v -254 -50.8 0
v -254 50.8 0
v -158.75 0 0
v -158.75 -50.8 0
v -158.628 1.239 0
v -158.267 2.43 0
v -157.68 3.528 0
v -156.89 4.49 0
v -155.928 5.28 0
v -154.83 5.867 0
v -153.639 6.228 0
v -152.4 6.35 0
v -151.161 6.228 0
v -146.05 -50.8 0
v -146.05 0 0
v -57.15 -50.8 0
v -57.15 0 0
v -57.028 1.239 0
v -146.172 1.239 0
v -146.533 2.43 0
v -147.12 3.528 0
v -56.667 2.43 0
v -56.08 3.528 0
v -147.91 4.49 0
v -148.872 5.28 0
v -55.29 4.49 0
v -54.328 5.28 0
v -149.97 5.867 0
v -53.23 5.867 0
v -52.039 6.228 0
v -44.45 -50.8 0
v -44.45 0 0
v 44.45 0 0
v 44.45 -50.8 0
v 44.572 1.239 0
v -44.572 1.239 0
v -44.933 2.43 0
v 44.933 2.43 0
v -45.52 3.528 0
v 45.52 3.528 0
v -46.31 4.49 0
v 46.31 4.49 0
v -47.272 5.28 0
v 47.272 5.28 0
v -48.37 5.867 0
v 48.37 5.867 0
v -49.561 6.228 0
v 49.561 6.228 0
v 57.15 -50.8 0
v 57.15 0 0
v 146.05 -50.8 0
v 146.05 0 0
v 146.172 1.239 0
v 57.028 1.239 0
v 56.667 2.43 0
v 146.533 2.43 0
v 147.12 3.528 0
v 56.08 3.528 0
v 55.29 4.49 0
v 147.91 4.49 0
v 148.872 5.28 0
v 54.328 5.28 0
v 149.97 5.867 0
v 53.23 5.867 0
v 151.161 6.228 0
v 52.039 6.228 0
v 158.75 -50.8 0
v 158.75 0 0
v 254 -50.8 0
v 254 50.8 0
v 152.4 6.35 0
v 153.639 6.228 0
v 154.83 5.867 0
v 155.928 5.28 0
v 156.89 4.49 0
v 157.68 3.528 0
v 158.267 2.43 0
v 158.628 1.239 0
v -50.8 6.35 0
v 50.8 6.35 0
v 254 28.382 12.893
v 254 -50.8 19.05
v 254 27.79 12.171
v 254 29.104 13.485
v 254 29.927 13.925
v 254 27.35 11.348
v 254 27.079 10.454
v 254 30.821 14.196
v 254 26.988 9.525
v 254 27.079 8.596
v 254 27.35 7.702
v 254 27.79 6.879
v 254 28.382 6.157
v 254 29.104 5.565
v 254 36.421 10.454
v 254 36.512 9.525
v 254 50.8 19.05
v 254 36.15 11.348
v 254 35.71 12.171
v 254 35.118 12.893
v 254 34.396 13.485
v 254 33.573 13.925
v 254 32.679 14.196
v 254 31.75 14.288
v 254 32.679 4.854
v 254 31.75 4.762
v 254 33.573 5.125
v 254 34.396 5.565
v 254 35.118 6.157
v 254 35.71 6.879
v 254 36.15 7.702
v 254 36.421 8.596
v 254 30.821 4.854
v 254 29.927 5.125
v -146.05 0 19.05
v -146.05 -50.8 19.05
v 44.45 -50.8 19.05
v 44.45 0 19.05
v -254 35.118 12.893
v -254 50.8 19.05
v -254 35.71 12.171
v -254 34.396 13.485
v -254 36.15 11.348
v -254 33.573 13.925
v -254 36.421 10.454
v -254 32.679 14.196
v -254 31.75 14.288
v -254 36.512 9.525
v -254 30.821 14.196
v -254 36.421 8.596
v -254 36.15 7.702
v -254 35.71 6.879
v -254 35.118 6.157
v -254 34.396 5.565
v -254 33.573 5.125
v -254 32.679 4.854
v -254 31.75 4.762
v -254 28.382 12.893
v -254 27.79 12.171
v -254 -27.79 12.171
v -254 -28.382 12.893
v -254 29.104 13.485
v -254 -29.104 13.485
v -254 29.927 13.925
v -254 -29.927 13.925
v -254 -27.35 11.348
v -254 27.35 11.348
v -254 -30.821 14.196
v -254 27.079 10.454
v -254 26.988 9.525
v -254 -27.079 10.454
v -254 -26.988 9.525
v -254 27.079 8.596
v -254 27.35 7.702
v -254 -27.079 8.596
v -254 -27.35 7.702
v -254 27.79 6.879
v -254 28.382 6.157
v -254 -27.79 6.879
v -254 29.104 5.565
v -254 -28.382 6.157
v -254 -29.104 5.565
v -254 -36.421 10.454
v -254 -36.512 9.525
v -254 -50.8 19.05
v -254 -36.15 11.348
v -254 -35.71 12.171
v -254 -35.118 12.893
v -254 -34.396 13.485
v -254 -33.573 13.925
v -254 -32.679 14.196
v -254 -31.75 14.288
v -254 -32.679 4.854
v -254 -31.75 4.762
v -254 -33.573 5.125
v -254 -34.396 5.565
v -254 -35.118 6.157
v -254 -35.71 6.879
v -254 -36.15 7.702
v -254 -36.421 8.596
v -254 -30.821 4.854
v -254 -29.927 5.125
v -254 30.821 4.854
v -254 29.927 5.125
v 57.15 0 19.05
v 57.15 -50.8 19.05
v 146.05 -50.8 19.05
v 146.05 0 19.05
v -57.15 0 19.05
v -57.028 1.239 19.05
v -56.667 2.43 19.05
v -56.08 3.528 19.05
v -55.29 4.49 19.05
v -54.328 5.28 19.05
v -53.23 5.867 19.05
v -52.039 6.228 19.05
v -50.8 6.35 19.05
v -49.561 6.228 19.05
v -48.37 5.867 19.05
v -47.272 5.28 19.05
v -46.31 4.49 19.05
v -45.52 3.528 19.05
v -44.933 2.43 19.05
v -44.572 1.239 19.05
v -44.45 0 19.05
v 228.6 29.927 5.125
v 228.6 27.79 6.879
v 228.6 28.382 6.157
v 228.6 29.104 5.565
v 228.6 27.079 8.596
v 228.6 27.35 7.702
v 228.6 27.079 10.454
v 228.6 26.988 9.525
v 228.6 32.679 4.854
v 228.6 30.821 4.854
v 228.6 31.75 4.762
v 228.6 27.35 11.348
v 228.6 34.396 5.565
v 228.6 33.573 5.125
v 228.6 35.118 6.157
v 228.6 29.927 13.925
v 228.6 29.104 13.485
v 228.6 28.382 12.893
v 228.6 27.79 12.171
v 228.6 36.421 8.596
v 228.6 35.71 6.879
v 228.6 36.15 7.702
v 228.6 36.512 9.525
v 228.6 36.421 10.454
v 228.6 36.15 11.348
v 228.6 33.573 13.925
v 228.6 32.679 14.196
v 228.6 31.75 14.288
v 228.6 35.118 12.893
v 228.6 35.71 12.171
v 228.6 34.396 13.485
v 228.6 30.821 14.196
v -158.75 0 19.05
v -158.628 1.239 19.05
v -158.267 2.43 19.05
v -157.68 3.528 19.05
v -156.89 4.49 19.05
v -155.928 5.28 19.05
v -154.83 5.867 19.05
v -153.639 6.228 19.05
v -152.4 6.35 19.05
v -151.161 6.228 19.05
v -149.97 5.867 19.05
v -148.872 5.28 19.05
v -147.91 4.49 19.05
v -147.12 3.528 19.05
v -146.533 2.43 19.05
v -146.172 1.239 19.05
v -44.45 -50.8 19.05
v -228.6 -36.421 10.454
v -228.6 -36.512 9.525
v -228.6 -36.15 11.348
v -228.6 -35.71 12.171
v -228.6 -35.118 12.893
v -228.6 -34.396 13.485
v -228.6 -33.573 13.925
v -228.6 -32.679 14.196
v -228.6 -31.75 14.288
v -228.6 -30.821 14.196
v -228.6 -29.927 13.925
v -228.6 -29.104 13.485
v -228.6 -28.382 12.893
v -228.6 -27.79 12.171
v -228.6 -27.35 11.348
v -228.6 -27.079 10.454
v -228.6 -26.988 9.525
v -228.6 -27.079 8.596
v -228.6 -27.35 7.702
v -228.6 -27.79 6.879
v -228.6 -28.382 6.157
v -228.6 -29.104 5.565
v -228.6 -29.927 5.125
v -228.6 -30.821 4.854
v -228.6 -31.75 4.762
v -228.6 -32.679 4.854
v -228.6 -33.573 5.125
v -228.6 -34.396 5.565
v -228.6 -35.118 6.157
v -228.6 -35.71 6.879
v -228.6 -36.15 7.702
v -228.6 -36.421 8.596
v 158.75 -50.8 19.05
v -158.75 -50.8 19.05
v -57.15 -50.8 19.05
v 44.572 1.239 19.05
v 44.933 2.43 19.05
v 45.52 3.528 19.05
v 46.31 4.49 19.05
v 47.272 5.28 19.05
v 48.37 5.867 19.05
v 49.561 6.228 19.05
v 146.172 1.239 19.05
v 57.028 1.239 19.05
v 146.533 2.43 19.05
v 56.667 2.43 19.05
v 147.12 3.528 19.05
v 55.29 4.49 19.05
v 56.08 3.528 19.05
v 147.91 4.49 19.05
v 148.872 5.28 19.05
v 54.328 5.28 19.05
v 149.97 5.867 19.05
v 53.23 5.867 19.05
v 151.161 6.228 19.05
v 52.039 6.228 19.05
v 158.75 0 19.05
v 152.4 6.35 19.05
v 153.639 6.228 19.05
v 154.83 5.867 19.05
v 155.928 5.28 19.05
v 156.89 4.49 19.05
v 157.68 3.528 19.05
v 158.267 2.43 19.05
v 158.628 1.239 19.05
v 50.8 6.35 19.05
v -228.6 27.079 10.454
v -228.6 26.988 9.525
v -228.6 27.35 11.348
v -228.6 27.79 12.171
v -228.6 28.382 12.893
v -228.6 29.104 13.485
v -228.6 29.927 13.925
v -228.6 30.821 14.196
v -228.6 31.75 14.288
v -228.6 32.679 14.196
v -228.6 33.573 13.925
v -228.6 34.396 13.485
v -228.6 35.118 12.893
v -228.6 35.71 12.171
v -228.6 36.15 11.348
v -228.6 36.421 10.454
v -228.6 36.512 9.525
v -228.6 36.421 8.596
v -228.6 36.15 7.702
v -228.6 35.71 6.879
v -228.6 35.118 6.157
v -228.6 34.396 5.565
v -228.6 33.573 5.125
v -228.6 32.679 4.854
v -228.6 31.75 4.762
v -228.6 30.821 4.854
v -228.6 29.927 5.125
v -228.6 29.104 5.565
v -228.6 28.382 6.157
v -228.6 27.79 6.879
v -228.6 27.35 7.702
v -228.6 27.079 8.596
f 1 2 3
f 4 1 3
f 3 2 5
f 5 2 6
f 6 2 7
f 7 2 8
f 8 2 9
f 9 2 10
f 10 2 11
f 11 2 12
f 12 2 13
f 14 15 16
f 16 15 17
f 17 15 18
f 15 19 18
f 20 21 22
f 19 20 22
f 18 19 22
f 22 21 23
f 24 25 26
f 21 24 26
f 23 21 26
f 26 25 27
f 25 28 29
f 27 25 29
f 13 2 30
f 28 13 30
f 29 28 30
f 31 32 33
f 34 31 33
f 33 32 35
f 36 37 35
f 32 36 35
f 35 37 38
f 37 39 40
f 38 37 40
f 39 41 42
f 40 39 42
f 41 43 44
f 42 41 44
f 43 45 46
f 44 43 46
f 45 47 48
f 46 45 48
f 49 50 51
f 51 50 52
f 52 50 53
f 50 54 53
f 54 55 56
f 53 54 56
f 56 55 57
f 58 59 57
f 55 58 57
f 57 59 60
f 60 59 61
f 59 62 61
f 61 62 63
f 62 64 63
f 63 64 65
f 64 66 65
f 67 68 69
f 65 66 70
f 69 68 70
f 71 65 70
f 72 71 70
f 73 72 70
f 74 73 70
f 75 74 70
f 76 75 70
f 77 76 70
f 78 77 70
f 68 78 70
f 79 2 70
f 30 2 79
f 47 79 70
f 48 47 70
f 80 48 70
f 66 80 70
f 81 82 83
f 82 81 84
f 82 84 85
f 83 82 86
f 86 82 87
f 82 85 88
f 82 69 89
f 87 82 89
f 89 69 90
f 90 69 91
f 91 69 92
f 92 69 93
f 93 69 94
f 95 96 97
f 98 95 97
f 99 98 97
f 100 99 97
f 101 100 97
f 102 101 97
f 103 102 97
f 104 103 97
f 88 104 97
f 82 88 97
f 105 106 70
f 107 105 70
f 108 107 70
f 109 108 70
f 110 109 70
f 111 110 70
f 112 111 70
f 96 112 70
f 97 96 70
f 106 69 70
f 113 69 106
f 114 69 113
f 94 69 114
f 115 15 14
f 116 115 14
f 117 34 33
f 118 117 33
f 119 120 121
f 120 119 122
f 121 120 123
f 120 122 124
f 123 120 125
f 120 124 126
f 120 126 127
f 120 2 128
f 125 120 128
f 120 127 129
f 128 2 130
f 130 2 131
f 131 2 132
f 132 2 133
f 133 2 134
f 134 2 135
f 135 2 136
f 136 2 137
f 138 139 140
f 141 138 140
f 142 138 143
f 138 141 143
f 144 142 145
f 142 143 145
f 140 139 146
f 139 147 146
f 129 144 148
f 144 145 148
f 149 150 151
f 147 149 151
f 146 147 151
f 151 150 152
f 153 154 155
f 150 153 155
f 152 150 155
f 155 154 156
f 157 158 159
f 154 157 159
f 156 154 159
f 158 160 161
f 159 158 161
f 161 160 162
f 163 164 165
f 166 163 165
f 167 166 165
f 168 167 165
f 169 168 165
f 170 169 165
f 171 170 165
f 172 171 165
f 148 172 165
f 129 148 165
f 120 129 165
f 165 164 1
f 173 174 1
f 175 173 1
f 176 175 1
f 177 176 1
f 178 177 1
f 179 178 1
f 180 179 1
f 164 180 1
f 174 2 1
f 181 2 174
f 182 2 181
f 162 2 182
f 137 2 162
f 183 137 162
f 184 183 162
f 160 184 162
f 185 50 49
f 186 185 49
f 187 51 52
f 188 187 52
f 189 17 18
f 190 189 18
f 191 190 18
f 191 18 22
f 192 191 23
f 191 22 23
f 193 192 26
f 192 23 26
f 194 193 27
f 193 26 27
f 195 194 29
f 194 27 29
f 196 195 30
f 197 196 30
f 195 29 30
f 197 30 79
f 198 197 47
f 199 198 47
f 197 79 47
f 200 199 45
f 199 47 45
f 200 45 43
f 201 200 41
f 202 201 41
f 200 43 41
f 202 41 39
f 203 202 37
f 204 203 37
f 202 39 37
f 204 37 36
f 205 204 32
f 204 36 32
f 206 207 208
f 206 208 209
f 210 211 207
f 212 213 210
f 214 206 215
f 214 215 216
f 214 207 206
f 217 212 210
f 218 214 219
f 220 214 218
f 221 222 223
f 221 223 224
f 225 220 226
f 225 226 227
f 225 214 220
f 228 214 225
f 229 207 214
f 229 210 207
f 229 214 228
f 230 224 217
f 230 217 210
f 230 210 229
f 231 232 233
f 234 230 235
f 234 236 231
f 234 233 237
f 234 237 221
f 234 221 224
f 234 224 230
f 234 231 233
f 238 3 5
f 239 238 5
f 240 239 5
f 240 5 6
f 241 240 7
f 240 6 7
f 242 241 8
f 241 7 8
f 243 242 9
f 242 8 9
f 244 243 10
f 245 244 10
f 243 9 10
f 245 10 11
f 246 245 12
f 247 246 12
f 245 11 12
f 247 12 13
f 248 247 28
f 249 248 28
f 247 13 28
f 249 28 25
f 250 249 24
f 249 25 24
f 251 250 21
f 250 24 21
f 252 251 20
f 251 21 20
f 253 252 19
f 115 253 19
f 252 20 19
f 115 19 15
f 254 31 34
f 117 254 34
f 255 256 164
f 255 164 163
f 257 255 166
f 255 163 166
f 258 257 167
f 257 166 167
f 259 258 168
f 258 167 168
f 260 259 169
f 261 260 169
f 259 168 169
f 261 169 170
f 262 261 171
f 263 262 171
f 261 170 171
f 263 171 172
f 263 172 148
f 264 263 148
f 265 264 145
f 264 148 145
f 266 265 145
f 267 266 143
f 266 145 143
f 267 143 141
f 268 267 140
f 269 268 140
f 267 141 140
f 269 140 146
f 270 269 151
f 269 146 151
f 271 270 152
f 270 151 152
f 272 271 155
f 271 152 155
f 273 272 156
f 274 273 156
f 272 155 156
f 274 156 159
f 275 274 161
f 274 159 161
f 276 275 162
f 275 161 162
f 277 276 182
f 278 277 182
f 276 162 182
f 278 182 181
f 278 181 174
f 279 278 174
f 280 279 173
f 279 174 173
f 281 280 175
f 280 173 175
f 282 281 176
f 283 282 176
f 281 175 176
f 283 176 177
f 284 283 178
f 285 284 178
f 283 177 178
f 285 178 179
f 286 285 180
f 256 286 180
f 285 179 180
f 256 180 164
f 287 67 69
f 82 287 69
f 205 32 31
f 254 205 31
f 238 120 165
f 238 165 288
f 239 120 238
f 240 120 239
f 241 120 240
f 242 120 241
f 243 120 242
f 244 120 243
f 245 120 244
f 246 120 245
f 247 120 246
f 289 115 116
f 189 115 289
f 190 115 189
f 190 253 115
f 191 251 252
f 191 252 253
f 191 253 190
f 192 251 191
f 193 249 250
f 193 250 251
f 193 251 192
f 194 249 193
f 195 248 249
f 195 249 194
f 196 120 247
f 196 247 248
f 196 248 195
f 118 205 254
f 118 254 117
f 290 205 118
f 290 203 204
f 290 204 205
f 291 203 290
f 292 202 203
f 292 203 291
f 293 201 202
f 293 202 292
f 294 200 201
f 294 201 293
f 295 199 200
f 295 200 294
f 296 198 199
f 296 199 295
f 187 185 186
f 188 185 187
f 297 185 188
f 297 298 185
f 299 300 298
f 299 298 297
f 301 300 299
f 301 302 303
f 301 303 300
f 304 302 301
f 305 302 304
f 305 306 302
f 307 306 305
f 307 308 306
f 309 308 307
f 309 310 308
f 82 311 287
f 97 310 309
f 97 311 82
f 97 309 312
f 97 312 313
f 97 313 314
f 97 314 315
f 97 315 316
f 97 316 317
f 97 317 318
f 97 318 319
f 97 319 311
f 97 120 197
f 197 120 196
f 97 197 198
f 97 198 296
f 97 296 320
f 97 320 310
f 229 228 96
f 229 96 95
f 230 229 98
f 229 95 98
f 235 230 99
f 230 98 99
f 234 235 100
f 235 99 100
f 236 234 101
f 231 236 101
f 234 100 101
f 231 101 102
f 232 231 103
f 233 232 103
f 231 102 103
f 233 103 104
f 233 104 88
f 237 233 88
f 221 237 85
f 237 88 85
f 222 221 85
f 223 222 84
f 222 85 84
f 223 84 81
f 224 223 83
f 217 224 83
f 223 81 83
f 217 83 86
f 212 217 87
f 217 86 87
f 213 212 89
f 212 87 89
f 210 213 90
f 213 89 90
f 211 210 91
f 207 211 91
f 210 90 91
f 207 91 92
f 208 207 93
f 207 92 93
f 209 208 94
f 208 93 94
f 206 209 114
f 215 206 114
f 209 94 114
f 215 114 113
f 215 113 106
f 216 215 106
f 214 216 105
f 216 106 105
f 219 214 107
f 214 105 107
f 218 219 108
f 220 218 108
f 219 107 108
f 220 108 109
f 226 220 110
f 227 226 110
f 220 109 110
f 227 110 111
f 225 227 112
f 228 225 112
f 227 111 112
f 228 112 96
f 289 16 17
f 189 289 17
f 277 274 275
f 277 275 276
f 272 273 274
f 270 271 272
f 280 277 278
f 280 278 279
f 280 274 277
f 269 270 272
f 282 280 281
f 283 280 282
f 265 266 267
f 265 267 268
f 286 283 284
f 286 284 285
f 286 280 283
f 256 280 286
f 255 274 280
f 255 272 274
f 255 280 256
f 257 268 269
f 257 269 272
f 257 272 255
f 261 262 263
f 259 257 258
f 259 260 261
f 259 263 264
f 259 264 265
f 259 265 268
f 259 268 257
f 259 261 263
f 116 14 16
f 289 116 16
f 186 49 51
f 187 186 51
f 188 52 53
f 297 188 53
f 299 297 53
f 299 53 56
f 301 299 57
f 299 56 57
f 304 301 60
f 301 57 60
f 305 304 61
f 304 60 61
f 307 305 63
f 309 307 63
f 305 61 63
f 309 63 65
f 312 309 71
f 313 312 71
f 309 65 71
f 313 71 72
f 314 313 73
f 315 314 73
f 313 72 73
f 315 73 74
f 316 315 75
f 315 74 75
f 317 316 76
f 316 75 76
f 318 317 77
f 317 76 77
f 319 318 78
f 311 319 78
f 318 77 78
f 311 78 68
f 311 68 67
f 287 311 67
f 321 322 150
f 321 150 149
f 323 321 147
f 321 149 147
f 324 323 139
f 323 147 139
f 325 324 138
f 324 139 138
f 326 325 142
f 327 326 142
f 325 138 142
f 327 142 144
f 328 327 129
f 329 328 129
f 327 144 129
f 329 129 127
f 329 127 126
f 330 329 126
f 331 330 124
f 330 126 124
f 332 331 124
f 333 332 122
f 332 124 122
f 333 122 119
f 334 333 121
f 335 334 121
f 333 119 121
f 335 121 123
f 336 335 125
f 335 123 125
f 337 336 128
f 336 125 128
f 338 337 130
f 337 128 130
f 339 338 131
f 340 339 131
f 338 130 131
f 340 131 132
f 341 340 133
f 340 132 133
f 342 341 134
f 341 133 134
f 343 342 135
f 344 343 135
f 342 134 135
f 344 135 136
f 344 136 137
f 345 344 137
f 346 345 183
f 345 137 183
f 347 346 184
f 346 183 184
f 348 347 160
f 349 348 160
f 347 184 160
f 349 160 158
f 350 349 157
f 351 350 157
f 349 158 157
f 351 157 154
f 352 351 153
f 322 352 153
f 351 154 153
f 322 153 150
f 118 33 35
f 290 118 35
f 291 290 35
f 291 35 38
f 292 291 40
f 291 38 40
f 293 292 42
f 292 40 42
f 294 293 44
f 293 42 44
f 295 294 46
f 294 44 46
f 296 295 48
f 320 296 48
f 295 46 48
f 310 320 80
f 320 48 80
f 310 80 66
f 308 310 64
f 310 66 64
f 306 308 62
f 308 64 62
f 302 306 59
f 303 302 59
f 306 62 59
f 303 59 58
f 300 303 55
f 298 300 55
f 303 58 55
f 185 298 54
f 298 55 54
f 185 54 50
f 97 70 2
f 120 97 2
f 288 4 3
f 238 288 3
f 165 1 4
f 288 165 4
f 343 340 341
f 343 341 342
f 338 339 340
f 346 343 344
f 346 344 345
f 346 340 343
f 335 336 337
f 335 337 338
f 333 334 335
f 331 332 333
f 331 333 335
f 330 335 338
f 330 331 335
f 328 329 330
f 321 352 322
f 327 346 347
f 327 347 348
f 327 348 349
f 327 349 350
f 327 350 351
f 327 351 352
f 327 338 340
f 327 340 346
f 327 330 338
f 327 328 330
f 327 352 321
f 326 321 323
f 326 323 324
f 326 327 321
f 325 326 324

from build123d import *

# Parameters (mm, degrees)
F1_DEPTH = 19.05
F2_R     = 4.7625
F3_DEPTH = 25.4
F4_R     = 4.7625
F5_DEPTH = 25.4


with BuildPart() as f1:
    # F0 (on Top) → F1 (new body)
    with BuildSketch(Plane.XY):
        with BuildLine():
            Line((254, -50.8), (254, 50.8))
            Line((254, 50.8), (-254, 50.8))
            Line((-254, 50.8), (-254, -50.8))
            Line((-254, -50.8), (-158.75, -50.8))
            Line((-158.75, -50.8), (-158.75, 0))
            ThreePointArc((-158.75, 0), (-152.4, 6.35), (-146.05, 0))
            Line((-146.05, 0), (-146.05, -50.8))
            Line((-146.05, -50.8), (-57.15, -50.8))
            Line((-57.15, -50.8), (-57.15, 0))
            ThreePointArc((-57.15, 0), (-50.8, 6.35), (-44.45, 0))
            Line((-44.45, 0), (-44.45, -50.8))
            Line((-44.45, -50.8), (44.45, -50.8))
            Line((44.45, -50.8), (44.45, 0))
            ThreePointArc((44.45, 0), (50.8, 6.35), (57.15, 0))
            Line((57.15, 0), (57.15, -50.8))
            Line((57.15, -50.8), (146.05, -50.8))
            Line((146.05, -50.8), (146.05, 0))
            ThreePointArc((146.05, 0), (152.4, 6.35), (158.75, 0))
            Line((158.75, 0), (158.75, -50.8))
            Line((158.75, -50.8), (254, -50.8))
        make_face()
    extrude(amount=F1_DEPTH)

    # F2 (on face) → F3 (cut)
    with BuildSketch(Plane.YZ.offset(254)):
        with Locations((31.75, 9.525)):
            Circle(F2_R)
    extrude(amount=-F3_DEPTH, mode=Mode.SUBTRACT)

    # F4 (on face) → F5 (cut)
    with BuildSketch(Plane(origin=(-254, 0, 0), x_dir=(0, -1, 0), z_dir=(-1, 0, 0))):
        with Locations((-31.75, 9.525)):
            Circle(F4_R)
        with Locations((31.75, 9.525)):
            Circle(F4_R)
    extrude(amount=-F5_DEPTH, mode=Mode.SUBTRACT)


solid = f1.part
